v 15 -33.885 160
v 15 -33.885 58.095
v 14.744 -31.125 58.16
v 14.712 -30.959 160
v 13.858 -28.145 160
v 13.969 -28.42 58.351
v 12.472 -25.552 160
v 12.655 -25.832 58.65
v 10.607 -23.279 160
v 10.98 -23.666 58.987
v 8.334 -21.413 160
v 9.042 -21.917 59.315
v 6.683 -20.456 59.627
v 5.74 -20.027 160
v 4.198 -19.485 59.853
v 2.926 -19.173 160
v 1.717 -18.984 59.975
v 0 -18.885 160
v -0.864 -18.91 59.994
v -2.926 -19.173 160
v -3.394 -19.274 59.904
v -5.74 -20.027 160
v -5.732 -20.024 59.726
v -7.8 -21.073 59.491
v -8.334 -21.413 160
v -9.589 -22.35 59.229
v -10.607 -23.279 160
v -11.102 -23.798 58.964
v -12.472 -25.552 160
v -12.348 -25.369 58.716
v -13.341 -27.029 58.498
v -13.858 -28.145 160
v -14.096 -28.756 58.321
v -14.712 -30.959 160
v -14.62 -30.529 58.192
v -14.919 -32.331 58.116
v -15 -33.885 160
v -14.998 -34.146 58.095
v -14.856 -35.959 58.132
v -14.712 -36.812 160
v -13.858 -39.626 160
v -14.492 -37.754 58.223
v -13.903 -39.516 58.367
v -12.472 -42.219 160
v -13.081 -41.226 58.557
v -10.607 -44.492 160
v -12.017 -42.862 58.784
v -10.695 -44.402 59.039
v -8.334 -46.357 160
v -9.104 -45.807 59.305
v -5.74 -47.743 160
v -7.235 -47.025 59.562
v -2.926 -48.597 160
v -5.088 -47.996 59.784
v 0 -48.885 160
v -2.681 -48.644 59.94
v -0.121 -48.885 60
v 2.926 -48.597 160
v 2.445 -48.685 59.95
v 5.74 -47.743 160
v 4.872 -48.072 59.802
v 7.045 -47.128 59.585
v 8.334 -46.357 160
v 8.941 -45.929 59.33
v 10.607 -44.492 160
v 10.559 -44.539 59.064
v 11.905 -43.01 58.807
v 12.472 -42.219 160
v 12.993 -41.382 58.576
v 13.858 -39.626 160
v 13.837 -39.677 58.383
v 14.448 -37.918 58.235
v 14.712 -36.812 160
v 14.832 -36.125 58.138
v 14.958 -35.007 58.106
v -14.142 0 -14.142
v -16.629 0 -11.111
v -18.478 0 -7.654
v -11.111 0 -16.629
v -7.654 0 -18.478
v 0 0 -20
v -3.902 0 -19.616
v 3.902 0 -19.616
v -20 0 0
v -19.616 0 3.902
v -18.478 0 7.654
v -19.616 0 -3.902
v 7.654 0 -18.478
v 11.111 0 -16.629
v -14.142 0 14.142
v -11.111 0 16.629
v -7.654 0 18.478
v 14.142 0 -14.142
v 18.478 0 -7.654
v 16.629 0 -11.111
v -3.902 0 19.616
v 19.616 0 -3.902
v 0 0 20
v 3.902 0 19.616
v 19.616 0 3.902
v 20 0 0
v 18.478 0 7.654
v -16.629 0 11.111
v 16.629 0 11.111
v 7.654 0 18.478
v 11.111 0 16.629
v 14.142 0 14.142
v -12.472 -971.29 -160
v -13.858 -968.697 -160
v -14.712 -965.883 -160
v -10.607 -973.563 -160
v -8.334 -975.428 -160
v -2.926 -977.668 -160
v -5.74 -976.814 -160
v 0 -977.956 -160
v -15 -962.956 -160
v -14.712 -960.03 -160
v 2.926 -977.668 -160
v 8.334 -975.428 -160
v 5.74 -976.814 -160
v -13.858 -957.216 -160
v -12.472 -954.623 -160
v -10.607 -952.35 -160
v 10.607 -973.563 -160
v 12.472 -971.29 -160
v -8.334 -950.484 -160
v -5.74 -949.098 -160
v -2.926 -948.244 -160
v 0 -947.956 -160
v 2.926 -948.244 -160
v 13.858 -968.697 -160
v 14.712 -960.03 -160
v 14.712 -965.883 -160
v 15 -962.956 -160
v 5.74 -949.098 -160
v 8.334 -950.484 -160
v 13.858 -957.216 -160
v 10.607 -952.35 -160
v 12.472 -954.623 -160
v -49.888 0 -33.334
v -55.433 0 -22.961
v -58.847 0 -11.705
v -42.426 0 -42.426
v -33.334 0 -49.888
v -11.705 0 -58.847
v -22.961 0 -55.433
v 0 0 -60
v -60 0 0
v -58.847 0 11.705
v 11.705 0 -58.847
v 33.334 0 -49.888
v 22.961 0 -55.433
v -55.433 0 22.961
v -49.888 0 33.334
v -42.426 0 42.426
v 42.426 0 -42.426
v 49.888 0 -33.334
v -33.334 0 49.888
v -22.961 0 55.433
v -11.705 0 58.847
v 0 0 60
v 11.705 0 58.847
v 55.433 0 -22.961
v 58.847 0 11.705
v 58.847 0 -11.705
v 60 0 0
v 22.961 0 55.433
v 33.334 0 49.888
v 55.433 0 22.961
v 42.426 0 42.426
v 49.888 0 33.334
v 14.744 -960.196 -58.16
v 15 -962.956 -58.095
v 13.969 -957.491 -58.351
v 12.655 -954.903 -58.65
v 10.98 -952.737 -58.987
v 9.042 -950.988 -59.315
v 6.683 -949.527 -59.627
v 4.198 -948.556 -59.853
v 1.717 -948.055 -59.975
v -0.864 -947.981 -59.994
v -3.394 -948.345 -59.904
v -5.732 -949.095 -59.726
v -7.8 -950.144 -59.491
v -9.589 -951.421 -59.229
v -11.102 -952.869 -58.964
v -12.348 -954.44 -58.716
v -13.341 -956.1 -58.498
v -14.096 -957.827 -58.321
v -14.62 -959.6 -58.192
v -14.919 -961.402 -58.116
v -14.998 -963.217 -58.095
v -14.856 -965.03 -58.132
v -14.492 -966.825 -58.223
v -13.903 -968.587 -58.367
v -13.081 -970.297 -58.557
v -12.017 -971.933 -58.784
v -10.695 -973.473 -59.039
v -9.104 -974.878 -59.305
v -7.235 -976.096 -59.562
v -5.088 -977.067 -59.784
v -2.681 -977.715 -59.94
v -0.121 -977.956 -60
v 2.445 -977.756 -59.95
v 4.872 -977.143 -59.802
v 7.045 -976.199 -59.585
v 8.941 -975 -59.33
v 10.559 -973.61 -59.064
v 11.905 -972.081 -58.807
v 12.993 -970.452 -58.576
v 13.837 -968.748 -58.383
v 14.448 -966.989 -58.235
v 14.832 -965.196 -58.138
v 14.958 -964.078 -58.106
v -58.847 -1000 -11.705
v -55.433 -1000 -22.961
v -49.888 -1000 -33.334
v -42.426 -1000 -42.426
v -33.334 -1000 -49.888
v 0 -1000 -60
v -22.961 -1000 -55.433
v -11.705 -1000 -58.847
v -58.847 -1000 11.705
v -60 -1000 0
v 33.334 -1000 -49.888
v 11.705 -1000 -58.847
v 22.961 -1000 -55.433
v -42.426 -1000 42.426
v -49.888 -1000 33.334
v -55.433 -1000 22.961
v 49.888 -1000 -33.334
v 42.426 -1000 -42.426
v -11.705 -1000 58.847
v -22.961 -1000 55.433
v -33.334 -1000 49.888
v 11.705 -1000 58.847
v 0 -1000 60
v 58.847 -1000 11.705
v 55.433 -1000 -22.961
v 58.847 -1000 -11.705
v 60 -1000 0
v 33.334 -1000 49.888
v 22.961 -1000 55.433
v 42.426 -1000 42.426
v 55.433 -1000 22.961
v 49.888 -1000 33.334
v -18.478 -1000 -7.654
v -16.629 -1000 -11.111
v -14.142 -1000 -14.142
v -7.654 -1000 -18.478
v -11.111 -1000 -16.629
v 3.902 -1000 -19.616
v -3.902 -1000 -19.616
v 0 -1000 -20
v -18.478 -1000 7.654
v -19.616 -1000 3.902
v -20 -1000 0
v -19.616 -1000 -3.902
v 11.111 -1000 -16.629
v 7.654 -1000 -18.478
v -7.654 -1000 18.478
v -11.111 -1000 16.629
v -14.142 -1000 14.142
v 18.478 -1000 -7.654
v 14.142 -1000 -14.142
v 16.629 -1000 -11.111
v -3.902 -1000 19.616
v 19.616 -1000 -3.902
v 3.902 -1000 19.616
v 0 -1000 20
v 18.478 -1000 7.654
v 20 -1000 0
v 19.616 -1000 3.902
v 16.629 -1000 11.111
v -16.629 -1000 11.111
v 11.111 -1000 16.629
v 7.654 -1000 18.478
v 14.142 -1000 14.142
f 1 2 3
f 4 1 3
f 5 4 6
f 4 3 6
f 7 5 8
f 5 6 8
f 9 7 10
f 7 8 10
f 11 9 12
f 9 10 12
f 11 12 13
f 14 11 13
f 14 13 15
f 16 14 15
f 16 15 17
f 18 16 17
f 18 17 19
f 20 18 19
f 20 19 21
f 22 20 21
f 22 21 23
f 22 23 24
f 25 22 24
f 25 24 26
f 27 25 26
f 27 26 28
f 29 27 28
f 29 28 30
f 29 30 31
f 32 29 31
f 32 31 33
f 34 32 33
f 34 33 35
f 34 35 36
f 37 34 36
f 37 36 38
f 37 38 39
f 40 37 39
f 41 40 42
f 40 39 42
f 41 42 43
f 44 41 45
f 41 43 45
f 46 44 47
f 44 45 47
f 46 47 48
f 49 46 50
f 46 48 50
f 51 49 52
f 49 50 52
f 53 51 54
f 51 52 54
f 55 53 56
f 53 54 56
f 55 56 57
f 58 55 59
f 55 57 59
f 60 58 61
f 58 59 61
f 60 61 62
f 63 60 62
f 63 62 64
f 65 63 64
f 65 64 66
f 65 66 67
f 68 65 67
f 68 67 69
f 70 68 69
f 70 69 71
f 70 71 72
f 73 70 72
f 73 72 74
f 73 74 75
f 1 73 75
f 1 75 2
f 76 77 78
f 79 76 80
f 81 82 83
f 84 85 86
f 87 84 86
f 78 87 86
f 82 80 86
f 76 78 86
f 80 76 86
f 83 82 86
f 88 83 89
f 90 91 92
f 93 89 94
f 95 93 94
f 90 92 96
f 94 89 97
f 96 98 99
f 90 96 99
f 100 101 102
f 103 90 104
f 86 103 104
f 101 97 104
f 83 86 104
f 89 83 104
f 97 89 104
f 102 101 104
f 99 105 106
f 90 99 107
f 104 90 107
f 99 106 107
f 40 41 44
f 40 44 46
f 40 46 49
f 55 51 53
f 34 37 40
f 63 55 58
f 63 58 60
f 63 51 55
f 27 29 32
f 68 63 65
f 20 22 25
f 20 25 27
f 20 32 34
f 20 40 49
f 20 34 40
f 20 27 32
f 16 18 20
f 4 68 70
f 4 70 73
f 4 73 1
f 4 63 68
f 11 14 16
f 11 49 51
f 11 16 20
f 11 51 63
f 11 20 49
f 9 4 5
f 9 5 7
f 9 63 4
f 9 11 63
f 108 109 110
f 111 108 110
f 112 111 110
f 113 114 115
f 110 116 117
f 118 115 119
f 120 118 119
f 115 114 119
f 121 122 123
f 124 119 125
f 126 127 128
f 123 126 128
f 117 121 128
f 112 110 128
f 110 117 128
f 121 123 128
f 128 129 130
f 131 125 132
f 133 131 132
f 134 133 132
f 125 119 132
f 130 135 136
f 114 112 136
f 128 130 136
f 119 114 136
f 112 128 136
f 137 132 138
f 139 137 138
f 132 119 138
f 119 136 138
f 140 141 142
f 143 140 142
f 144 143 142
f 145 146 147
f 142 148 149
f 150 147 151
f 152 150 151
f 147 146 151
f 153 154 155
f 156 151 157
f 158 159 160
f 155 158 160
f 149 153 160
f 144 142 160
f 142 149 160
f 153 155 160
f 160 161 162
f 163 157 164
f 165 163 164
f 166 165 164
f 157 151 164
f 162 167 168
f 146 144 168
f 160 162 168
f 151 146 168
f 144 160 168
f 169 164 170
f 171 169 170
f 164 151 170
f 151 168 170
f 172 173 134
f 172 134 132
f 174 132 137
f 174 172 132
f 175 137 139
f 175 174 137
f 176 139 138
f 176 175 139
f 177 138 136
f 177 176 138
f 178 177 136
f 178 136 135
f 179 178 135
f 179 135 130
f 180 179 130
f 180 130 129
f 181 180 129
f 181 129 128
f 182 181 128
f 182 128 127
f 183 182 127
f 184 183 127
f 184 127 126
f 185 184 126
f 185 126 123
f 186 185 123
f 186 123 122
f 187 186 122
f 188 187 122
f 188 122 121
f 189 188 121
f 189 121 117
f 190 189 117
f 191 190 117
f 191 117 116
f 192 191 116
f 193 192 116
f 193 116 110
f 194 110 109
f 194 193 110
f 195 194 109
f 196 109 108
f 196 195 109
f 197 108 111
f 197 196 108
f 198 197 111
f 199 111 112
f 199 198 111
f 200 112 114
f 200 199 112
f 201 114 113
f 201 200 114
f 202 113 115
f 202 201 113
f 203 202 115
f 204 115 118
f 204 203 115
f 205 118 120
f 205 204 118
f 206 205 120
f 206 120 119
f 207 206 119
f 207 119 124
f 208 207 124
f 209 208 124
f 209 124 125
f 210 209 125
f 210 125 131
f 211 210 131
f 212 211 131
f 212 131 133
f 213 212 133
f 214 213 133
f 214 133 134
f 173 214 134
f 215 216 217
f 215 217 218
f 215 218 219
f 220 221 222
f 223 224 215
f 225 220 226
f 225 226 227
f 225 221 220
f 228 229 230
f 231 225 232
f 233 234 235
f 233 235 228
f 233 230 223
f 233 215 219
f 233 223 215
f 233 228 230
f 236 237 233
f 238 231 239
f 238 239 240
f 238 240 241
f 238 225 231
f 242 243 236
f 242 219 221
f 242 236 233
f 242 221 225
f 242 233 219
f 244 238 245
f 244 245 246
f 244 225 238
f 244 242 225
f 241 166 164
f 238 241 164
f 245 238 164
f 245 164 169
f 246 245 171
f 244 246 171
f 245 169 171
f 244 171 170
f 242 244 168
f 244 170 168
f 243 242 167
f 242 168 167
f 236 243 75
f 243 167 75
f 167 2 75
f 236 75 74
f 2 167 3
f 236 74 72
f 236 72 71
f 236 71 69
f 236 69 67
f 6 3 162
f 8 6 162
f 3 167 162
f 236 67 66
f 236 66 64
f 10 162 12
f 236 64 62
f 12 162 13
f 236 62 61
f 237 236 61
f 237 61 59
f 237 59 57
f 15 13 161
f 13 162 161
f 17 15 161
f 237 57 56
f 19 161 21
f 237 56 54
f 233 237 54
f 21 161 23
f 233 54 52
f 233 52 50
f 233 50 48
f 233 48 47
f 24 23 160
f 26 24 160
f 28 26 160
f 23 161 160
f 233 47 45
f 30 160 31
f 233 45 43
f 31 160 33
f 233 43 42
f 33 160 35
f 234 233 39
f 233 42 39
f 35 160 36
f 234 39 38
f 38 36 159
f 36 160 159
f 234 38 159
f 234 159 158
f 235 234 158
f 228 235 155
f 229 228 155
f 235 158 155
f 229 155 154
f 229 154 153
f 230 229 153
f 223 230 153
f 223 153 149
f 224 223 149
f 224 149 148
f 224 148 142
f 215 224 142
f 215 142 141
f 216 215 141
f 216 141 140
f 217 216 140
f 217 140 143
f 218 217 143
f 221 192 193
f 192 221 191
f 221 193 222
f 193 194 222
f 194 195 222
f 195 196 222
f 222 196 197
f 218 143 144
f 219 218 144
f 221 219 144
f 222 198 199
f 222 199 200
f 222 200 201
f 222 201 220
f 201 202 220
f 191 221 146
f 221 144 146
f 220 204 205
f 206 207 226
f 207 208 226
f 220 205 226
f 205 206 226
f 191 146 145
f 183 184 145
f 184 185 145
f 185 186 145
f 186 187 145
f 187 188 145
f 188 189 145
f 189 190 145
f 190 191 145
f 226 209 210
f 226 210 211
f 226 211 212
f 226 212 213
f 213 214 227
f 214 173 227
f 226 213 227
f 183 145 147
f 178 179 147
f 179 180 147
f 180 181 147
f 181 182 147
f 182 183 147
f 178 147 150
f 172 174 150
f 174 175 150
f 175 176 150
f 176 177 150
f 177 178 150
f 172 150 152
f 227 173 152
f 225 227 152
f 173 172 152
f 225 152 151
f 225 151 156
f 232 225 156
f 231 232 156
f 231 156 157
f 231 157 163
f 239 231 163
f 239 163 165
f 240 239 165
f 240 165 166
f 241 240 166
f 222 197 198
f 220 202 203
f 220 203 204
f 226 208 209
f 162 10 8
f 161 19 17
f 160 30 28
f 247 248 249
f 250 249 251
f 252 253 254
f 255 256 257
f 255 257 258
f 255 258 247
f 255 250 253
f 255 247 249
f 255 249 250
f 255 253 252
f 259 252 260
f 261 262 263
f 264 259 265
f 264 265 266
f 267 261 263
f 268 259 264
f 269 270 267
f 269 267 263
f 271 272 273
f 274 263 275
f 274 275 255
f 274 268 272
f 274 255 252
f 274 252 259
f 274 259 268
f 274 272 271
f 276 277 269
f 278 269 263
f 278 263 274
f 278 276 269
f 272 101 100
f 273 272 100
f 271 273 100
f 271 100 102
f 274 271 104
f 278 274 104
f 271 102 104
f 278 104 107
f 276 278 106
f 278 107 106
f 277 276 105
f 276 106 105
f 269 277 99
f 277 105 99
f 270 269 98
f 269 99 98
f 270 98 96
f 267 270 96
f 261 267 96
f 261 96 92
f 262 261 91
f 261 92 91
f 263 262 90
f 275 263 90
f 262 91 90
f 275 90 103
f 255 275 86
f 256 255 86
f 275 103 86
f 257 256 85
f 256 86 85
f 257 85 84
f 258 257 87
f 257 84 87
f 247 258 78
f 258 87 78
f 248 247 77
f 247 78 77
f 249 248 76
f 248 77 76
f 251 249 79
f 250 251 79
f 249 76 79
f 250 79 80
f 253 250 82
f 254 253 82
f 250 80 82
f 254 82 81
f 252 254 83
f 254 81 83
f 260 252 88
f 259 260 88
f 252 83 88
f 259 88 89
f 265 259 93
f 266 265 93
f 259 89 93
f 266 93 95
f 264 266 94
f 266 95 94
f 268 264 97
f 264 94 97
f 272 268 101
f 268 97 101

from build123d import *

# Parameters (mm, degrees)
F0_R     = 60
F2_DEPTH = 1000
F1_R     = 20
F3_R     = 15
F4_DEPTH = 160
F5_R     = 15
F6_DEPTH = 160


with BuildPart() as f2:
    # F0 (on Front) → F2 (new body)
    with BuildSketch(Plane.XZ):
        Circle(F0_R)
    extrude(amount=F2_DEPTH)

    # F3 (on Top) → F4 (join)
    with BuildSketch(Plane.XY):
        with Locations((0, -33.885266772)):
            Circle(F3_R)
    extrude(amount=F4_DEPTH)

    # F5 (on Top) → F6 (join)
    with BuildSketch(Plane.XY):
        with Locations((0, -962.9562497139)):
            Circle(F5_R)
    extrude(amount=-F6_DEPTH)


with BuildPart() as f2b:
    # F1 (on Front) → F2, piece 2 (new body)
    with BuildSketch(Plane.XZ):
        Circle(F1_R)
    extrude(amount=F2_DEPTH)


solid = Compound([f2.part, f2b.part])
